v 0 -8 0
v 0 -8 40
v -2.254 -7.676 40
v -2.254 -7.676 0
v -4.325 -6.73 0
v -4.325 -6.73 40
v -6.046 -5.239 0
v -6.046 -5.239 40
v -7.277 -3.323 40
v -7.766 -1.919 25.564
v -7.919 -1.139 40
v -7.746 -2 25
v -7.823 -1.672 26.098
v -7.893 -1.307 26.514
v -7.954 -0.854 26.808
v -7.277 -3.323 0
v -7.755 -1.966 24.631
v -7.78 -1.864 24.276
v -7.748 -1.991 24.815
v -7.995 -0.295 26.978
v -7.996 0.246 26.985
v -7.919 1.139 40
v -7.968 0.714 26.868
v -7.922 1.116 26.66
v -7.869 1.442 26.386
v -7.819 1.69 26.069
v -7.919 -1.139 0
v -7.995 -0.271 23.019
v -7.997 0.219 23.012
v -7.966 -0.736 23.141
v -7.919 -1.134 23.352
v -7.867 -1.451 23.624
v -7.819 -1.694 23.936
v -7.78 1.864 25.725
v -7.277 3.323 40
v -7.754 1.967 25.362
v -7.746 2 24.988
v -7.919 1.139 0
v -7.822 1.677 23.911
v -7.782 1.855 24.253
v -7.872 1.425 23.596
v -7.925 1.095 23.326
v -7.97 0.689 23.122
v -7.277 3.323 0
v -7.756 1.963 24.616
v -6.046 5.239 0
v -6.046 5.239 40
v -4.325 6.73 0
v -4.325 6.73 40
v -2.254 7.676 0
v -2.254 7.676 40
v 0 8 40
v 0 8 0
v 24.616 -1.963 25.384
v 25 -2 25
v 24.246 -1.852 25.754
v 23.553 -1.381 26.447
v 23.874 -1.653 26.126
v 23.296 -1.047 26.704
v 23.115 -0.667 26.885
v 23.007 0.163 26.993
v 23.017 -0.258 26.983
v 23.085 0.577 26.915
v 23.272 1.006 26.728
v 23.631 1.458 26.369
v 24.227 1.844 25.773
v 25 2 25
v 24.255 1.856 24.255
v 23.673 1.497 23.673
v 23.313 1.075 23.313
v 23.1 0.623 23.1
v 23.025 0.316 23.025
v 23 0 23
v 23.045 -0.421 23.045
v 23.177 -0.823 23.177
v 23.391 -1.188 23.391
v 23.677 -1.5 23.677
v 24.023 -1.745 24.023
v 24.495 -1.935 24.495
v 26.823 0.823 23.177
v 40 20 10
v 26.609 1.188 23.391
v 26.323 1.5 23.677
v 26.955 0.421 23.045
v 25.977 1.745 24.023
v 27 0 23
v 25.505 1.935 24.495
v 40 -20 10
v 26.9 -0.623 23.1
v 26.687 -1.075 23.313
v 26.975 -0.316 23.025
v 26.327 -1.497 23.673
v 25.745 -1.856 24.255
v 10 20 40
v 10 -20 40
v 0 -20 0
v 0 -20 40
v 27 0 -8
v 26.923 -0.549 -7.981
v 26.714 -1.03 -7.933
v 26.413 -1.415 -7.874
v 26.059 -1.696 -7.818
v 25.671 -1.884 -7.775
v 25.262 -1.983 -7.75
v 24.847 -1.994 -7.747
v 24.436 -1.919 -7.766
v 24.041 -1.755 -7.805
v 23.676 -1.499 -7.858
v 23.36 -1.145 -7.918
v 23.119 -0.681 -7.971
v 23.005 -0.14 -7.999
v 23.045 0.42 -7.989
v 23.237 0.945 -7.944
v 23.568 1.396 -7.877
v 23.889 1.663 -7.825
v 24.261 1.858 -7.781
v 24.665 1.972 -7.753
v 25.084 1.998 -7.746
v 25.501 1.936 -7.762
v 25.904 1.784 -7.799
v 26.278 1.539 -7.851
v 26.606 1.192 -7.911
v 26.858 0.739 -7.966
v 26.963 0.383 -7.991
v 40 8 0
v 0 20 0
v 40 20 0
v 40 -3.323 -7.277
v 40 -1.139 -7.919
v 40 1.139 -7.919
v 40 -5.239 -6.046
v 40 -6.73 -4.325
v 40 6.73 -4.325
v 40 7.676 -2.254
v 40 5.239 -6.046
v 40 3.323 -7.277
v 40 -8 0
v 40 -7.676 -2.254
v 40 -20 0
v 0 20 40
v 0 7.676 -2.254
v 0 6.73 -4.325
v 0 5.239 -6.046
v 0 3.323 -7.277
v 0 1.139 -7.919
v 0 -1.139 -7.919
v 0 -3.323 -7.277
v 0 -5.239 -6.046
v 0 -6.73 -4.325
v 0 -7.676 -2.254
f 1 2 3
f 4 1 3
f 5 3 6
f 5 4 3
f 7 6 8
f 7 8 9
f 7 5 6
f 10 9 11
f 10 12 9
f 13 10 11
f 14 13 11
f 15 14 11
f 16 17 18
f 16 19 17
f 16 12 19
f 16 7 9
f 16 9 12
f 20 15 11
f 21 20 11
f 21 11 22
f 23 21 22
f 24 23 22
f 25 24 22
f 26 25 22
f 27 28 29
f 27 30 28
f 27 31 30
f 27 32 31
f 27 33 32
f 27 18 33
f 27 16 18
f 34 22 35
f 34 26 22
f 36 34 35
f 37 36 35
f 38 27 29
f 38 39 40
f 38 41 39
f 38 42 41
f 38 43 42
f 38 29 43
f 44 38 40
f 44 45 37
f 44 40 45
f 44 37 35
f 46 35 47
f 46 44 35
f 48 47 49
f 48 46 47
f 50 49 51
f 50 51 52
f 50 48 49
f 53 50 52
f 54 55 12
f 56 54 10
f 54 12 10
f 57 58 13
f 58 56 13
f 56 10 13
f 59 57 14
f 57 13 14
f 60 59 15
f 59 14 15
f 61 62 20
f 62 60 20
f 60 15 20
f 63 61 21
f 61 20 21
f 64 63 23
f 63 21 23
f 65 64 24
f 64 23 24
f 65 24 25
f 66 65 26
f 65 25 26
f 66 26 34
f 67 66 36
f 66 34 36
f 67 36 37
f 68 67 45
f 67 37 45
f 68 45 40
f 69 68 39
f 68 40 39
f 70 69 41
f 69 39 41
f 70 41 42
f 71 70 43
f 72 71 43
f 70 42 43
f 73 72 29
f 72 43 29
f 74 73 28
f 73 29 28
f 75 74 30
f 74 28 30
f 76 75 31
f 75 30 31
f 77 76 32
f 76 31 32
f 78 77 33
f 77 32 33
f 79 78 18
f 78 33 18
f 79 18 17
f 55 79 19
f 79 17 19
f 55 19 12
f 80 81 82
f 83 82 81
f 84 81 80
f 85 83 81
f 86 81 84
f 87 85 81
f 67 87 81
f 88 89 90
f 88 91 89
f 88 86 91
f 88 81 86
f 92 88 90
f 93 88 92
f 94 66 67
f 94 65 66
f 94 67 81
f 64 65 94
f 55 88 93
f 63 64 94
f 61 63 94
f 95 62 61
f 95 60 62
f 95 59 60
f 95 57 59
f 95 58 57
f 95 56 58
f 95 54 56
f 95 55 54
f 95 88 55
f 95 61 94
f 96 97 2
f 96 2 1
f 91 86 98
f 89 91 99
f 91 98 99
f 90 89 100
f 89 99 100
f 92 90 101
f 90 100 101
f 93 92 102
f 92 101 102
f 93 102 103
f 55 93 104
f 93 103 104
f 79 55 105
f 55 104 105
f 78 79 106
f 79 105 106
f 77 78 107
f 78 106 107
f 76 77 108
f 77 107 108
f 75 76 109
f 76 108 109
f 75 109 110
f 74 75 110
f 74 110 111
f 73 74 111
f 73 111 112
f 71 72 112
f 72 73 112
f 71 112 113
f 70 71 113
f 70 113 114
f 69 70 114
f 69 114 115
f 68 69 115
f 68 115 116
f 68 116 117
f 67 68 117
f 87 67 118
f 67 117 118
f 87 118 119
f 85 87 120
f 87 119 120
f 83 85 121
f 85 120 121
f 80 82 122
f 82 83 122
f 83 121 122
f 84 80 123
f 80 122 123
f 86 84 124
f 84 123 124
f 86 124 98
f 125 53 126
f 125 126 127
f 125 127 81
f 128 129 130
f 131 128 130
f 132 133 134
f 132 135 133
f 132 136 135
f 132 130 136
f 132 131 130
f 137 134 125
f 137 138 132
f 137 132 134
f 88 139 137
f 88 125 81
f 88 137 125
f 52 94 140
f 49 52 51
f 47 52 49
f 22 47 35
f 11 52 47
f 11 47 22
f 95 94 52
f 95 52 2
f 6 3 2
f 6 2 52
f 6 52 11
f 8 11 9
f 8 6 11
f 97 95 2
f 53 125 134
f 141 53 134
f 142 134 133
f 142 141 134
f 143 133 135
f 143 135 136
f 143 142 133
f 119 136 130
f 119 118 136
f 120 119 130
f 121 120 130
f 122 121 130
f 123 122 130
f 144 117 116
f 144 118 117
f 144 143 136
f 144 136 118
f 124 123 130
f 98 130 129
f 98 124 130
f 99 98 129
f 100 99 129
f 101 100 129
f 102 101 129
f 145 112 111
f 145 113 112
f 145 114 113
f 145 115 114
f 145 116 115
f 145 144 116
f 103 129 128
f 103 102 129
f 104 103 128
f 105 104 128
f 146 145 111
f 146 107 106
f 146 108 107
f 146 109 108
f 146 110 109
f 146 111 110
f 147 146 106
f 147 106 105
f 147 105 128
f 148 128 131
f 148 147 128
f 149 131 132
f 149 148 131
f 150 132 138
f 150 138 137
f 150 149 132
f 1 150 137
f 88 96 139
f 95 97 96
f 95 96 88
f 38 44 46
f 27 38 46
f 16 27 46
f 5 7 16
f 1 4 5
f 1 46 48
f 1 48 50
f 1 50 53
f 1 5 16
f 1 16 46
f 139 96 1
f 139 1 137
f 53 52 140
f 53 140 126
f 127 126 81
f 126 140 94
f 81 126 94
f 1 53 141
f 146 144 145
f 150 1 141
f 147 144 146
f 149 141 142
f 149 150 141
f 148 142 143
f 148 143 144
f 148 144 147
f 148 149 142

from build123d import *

# Parameters (mm, degrees)
F1_DEPTH = 20
F3_DEPTH = 40
F5_DEPTH = 40
F6_R     = 2
F7_DEPTH = 50
F8_R     = 2
F9_DEPTH = 50


with BuildPart() as f1:
    # F0 (on Front) → F1 (new body, symmetric)
    with BuildSketch(Plane.XZ):
        Polygon((0, 40), (0, 0), (40, 0), (40, 10), (10, 40), align=None)
    extrude(amount=F1_DEPTH, both=True)

    # F2 (on face) → F3 (join)
    with BuildSketch(Plane(origin=(0, 0, 0), x_dir=(0, -1, 0), z_dir=(-1, 0, 0))):
        with BuildLine():
            ThreePointArc((-8, 0), (0, -8), (8, 0))
            Line((8, 0), (-8, 0))
        make_face()
    extrude(amount=-F3_DEPTH)

    # F4 (on face) → F5 (join)
    with BuildSketch(Plane(origin=(0, 0, 0), x_dir=(1, 0, 0), z_dir=(0, 0, -1))):
        with BuildLine():
            ThreePointArc((0, -8), (5.6568542495, -5.6568542495), (8, 0))
            ThreePointArc((8, 0), (5.6568542495, 5.6568542495), (0, 8))
            ThreePointArc((0, 8), (-8, 0), (0, -8))
        make_face()
    extrude(amount=-F5_DEPTH)

    # F6 (on face) → F7 (cut, symmetric)
    with BuildSketch(Plane(origin=(0, 0, 0), x_dir=(0, -1, 0), z_dir=(-1, 0, 0))):
        with Locations((0, 25)):
            Circle(F6_R)
    extrude(amount=F7_DEPTH, both=True, mode=Mode.SUBTRACT)

    # F8 (on face) → F9 (cut, symmetric)
    with BuildSketch(Plane(origin=(0, 0, 0), x_dir=(1, 0, 0), z_dir=(0, 0, -1))):
        with Locations((25, 0)):
            Circle(F8_R)
    extrude(amount=F9_DEPTH, both=True, mode=Mode.SUBTRACT)


solid = f1.part
